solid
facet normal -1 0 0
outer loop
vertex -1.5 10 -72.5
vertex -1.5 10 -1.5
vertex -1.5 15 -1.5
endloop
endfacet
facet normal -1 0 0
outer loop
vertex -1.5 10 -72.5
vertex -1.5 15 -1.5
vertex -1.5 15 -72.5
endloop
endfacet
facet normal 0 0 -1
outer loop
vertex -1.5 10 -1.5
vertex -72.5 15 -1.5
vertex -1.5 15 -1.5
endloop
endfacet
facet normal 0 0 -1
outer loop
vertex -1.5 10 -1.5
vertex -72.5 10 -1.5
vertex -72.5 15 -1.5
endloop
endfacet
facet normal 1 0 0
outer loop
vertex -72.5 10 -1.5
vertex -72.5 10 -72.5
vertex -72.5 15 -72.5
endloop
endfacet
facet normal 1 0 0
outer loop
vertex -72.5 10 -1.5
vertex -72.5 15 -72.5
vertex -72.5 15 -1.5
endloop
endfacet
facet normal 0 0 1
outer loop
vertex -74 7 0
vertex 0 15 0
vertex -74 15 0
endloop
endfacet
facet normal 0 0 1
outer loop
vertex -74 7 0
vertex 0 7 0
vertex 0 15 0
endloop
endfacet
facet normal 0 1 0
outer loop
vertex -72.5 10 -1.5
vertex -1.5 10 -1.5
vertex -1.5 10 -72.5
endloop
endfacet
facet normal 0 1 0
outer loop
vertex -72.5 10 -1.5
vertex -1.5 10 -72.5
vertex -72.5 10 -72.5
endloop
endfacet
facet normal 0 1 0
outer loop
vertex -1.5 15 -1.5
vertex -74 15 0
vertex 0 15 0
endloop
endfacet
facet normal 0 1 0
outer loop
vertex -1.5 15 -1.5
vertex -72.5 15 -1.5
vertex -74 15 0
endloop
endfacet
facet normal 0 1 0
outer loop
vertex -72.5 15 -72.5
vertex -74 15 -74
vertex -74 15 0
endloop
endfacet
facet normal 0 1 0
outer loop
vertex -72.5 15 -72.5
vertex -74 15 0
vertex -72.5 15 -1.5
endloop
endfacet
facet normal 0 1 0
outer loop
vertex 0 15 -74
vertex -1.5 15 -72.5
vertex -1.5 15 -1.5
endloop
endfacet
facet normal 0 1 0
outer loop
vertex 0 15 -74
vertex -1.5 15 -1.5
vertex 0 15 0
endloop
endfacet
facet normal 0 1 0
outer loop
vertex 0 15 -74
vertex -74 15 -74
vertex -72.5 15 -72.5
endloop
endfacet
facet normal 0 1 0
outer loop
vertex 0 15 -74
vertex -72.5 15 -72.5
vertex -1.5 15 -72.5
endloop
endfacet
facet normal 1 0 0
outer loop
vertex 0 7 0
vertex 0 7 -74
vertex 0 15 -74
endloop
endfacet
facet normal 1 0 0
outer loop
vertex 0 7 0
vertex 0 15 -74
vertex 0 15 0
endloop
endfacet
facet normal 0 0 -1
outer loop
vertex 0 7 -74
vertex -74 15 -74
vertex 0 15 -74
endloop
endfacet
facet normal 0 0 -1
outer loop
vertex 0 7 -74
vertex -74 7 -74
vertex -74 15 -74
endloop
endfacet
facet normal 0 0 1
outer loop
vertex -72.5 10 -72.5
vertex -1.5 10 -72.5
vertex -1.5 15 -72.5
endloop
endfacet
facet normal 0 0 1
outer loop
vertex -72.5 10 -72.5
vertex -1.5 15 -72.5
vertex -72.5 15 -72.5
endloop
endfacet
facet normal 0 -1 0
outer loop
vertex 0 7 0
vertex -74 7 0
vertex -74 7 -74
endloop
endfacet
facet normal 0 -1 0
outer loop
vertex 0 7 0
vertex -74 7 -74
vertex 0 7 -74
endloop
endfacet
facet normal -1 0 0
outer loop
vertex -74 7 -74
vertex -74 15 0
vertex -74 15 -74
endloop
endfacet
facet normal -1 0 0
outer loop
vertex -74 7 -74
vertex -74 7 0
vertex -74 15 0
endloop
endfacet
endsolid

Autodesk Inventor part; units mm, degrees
ref_plane "YZ Plane" through (0, 0, 0) normal (1, 0, 0) x (0, 1, 0)
ref_plane "XZ Plane" through (0, 0, 0) normal (0, 1, 0) x (-1, 0, 0)
ref_plane "XY Plane" through (0, 0, 0) normal (0, 0, 1) x (1, 0, 0)
sketch "Sketch1" plane through (0, 0, 0) normal (0, 1, 0) x (-1, 0, 0)
  line L0 (0, 0) -> (74, 0)
  line L1 (74, 0) -> (74, -74)
  line L2 (74, -74) -> (0, -74)
  line L3 (0, -74) -> (0, 0)
  dimension "d0" = 74
  dimension "d1" = 74
extrude "Extrusion1" add sketch "Sketch1" along normal blind 10
sketch "Sketch2" plane through (0, 10, 0) normal (0, 1, 0) x (1, 0, 0)
  line L0 (0, 0) -> (0, 74) projected
  line L1 (0, 74) -> (-74, 74) projected
  line L2 (0, 0) -> (-74, 0)
  line L3 (-74, 0) -> (-74, 74)
  line L4 (-74, 74) -> (0, 74)
  line L5 (0, 74) -> (0, 0)
  line L6 (-72.5, 72.5) -> (-72.5, 1.5)
  line L7 (-72.5, 1.5) -> (-1.5, 1.5)
  line L8 (-1.5, 1.5) -> (-1.5, 72.5)
  line L9 (-1.5, 72.5) -> (-72.5, 72.5)
  dimension "d4" = 1.5
extrude "Extrusion2" add sketch "Sketch2" along normal blind 5
sketch "Sketch3" plane through (0, 0, 0) normal (0, -1, 0) x (1, 0, 0)
  line L0 (0, 0) -> (0, -74) projected
  line L1 (0, 0) -> (-74, 0)
  line L2 (-74, 0) -> (-74, -74)
  line L3 (-74, -74) -> (0, -74)
  line L4 (0, -74) -> (0, 0)
extrude "Extrusion3" cut sketch "Sketch3" against normal blind 5
sketch "Sketch4" plane through (0, 5, 0) normal (0, -1, 0) x (1, 0, 0)
  line L0 (0, 0) -> (0, -74) projected
  line L1 (-74, -74) -> (0, -74)
  line L2 (0, -74) -> (0, 0)
  line L3 (0, 0) -> (-74, 0)
  line L4 (-74, 0) -> (-74, -74)
extrude "Extrusion4" cut sketch "Sketch4" against normal blind 2
properties part number "DiffusorCapThin"
